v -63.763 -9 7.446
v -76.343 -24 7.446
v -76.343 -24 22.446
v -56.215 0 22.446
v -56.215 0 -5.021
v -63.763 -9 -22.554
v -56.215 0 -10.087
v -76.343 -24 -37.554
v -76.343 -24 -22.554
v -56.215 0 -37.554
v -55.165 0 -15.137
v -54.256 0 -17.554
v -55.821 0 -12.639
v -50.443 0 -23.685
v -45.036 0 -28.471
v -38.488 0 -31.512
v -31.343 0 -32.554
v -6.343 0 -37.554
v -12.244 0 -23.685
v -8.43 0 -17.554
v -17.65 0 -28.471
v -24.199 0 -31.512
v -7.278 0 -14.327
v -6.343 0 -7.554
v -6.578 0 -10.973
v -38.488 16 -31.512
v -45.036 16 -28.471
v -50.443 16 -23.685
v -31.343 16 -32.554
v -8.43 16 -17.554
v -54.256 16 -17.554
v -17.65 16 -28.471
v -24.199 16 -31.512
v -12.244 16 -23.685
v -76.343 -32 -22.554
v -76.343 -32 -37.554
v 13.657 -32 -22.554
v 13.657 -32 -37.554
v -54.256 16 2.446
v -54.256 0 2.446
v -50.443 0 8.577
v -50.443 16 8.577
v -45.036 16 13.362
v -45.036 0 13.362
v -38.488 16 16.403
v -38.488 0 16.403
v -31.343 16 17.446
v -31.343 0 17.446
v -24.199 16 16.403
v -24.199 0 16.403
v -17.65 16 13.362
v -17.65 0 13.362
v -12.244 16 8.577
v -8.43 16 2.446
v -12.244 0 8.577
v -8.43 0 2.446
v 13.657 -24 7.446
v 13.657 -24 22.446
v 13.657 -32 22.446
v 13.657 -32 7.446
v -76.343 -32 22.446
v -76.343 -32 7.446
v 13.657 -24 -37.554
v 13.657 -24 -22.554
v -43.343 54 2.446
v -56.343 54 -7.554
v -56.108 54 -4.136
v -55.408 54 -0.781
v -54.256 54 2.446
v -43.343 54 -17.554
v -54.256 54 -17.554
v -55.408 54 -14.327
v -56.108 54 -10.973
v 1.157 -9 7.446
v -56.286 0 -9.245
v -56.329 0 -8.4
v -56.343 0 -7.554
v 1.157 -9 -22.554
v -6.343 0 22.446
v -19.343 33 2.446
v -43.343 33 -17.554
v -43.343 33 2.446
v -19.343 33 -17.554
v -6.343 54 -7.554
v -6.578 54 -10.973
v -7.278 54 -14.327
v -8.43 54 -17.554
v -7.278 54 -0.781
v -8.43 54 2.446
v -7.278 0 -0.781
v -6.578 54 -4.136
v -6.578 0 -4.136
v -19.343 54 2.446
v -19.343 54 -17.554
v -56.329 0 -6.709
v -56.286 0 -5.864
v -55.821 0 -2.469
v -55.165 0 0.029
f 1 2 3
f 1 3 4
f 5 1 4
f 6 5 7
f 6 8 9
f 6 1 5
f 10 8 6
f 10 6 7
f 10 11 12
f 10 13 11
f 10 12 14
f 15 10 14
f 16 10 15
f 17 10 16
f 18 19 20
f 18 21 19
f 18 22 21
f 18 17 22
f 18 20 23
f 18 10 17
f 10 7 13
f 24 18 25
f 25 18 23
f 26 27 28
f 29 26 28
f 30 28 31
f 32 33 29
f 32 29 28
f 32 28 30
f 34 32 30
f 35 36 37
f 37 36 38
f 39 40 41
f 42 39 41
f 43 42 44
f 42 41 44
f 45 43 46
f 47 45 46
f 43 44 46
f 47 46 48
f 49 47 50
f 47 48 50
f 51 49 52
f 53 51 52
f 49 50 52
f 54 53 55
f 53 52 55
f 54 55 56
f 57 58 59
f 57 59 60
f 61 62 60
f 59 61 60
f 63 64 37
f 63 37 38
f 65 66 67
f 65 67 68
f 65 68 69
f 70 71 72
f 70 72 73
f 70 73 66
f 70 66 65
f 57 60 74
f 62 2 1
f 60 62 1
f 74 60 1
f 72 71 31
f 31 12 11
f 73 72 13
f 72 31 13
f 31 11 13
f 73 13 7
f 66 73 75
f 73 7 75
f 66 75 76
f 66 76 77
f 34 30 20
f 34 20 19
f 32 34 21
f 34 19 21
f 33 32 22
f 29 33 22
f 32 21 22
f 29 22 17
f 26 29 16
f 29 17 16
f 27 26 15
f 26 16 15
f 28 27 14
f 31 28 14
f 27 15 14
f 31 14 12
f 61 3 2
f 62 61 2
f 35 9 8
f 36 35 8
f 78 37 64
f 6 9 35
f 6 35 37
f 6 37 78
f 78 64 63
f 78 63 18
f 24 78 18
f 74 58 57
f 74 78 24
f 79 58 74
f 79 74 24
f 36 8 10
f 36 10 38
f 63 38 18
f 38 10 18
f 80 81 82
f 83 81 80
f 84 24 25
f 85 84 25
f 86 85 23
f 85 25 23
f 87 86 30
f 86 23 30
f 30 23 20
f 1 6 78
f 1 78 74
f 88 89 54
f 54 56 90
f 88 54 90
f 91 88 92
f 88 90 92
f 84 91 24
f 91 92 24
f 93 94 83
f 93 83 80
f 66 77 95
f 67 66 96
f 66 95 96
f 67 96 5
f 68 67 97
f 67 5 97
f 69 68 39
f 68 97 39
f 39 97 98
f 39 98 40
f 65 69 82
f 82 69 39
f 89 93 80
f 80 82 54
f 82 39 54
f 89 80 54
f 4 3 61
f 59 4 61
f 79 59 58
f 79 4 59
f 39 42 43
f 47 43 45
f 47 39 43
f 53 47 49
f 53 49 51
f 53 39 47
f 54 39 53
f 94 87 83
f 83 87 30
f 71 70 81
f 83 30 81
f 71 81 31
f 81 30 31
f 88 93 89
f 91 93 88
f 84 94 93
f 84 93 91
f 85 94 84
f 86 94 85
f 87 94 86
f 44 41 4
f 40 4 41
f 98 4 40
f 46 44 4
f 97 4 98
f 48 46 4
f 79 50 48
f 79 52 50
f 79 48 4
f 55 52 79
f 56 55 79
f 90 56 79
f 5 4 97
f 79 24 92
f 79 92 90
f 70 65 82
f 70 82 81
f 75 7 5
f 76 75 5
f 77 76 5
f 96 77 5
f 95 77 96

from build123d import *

# Parameters (mm, degrees)
SKETCH4_W            = 90
SKETCH4_H            = 60
BOSS_EXTRUDE13_DEPTH = 32
BOSS_EXTRUDE14_DEPTH = 54
SKETCH4_30_W         = 24
SKETCH4_30_H         = 20
BOSS_EXTRUDE16_DEPTH = 33
BOSS_EXTRUDE17_DEPTH = 16
SKETCH5_W            = 30
SKETCH5_H            = 23
CUT_EXTRUDE2_DEPTH   = 100
CUT_EXTRUDE3_DEPTH   = 100
CUT_EXTRUDE6_DEPTH   = 100


with BuildPart() as part:
    # Sketch4 → Boss-Extrude13 (new body)
    with BuildSketch(Plane(origin=(0, 0, 0), x_dir=(1, 0, 0), z_dir=(0, 1, 0))):
        with Locations((-31.3432161, 7.554270448)):
            Rectangle(SKETCH4_W, SKETCH4_H)
    extrude(amount=-BOSS_EXTRUDE13_DEPTH)

    # Sketch4<27> → Boss-Extrude14 (add)
    with BuildSketch(Plane(origin=(0, 0, 0), x_dir=(1, 0, 0), z_dir=(0, 1, 0))):
        with BuildLine():
            ThreePointArc((-54.256094575, 17.554270448), (-56.3432161, 7.554270448), (-54.256094575, -2.445729552))
            Line((-54.256094575, -2.445729552), (-43.3432161, -2.445729552))
            Line((-43.3432161, -2.445729552), (-43.3432161, 17.554270448))
            Line((-43.3432161, 17.554270448), (-54.256094575, 17.554270448))
        make_face()
        with BuildLine():
            ThreePointArc((-8.430337625, -2.445729552), (-6.3432161, 7.554270448), (-8.430337625, 17.554270448))
            Line((-8.430337625, 17.554270448), (-19.3432161, 17.554270448))
            Line((-19.3432161, 17.554270448), (-19.3432161, -2.445729552))
            Line((-19.3432161, -2.445729552), (-8.430337625, -2.445729552))
        make_face()
    extrude(amount=BOSS_EXTRUDE14_DEPTH)

    # Sketch4<30> → Boss-Extrude16 (add)
    with BuildSketch(Plane(origin=(0, 0, 0), x_dir=(1, 0, 0), z_dir=(0, 1, 0))):
        with Locations((-31.3432161, 7.554270448)):
            Rectangle(SKETCH4_30_W, SKETCH4_30_H)
    extrude(amount=BOSS_EXTRUDE16_DEPTH)

    # Sketch4<31> → Boss-Extrude17 (add)
    with BuildSketch(Plane(origin=(0, 0, 0), x_dir=(1, 0, 0), z_dir=(0, 1, 0))):
        with BuildLine():
            ThreePointArc((-8.430337625, 17.554270448), (-31.3432161, 32.554270448), (-54.256094575, 17.554270448))
            Line((-54.256094575, 17.554270448), (-8.430337625, 17.554270448))
        make_face()
        with BuildLine():
            Line((-8.430337625, -2.445729552), (-54.256094575, -2.445729552))
            ThreePointArc((-54.256094575, -2.445729552), (-31.3432161, -17.445729552), (-8.430337625, -2.445729552))
        make_face()
    extrude(amount=BOSS_EXTRUDE17_DEPTH)

    # Sketch5 → Cut-Extrude2 (cut)
    with BuildSketch(Plane.ZY.offset(76.3432161)):
        with Locations((-7.554270448, -20.5)):
            Rectangle(SKETCH5_W, SKETCH5_H)
    extrude(amount=-CUT_EXTRUDE2_DEPTH, mode=Mode.SUBTRACT)

    # Sketch7 → Cut-Extrude3 (cut)
    with BuildSketch(Plane.XY):
        Polygon((-76.3432161, 0), (-76.3432161, -24), (-56.214551836, 0), align=None)
        Polygon((-6.3432161, 0), (13.6567839, -24), (13.6567839, 0), align=None)
    extrude(amount=-CUT_EXTRUDE3_DEPTH, mode=Mode.SUBTRACT)

    # Sketch7<4> → Cut-Extrude6 (cut)
    with BuildSketch(Plane.XY):
        Polygon((-76.3432161, 0), (-76.3432161, -24), (-56.214551836, 0), align=None)
        Polygon((-6.3432161, 0), (13.6567839, -24), (13.6567839, 0), align=None)
    extrude(amount=CUT_EXTRUDE6_DEPTH, mode=Mode.SUBTRACT)


solid = part.part
